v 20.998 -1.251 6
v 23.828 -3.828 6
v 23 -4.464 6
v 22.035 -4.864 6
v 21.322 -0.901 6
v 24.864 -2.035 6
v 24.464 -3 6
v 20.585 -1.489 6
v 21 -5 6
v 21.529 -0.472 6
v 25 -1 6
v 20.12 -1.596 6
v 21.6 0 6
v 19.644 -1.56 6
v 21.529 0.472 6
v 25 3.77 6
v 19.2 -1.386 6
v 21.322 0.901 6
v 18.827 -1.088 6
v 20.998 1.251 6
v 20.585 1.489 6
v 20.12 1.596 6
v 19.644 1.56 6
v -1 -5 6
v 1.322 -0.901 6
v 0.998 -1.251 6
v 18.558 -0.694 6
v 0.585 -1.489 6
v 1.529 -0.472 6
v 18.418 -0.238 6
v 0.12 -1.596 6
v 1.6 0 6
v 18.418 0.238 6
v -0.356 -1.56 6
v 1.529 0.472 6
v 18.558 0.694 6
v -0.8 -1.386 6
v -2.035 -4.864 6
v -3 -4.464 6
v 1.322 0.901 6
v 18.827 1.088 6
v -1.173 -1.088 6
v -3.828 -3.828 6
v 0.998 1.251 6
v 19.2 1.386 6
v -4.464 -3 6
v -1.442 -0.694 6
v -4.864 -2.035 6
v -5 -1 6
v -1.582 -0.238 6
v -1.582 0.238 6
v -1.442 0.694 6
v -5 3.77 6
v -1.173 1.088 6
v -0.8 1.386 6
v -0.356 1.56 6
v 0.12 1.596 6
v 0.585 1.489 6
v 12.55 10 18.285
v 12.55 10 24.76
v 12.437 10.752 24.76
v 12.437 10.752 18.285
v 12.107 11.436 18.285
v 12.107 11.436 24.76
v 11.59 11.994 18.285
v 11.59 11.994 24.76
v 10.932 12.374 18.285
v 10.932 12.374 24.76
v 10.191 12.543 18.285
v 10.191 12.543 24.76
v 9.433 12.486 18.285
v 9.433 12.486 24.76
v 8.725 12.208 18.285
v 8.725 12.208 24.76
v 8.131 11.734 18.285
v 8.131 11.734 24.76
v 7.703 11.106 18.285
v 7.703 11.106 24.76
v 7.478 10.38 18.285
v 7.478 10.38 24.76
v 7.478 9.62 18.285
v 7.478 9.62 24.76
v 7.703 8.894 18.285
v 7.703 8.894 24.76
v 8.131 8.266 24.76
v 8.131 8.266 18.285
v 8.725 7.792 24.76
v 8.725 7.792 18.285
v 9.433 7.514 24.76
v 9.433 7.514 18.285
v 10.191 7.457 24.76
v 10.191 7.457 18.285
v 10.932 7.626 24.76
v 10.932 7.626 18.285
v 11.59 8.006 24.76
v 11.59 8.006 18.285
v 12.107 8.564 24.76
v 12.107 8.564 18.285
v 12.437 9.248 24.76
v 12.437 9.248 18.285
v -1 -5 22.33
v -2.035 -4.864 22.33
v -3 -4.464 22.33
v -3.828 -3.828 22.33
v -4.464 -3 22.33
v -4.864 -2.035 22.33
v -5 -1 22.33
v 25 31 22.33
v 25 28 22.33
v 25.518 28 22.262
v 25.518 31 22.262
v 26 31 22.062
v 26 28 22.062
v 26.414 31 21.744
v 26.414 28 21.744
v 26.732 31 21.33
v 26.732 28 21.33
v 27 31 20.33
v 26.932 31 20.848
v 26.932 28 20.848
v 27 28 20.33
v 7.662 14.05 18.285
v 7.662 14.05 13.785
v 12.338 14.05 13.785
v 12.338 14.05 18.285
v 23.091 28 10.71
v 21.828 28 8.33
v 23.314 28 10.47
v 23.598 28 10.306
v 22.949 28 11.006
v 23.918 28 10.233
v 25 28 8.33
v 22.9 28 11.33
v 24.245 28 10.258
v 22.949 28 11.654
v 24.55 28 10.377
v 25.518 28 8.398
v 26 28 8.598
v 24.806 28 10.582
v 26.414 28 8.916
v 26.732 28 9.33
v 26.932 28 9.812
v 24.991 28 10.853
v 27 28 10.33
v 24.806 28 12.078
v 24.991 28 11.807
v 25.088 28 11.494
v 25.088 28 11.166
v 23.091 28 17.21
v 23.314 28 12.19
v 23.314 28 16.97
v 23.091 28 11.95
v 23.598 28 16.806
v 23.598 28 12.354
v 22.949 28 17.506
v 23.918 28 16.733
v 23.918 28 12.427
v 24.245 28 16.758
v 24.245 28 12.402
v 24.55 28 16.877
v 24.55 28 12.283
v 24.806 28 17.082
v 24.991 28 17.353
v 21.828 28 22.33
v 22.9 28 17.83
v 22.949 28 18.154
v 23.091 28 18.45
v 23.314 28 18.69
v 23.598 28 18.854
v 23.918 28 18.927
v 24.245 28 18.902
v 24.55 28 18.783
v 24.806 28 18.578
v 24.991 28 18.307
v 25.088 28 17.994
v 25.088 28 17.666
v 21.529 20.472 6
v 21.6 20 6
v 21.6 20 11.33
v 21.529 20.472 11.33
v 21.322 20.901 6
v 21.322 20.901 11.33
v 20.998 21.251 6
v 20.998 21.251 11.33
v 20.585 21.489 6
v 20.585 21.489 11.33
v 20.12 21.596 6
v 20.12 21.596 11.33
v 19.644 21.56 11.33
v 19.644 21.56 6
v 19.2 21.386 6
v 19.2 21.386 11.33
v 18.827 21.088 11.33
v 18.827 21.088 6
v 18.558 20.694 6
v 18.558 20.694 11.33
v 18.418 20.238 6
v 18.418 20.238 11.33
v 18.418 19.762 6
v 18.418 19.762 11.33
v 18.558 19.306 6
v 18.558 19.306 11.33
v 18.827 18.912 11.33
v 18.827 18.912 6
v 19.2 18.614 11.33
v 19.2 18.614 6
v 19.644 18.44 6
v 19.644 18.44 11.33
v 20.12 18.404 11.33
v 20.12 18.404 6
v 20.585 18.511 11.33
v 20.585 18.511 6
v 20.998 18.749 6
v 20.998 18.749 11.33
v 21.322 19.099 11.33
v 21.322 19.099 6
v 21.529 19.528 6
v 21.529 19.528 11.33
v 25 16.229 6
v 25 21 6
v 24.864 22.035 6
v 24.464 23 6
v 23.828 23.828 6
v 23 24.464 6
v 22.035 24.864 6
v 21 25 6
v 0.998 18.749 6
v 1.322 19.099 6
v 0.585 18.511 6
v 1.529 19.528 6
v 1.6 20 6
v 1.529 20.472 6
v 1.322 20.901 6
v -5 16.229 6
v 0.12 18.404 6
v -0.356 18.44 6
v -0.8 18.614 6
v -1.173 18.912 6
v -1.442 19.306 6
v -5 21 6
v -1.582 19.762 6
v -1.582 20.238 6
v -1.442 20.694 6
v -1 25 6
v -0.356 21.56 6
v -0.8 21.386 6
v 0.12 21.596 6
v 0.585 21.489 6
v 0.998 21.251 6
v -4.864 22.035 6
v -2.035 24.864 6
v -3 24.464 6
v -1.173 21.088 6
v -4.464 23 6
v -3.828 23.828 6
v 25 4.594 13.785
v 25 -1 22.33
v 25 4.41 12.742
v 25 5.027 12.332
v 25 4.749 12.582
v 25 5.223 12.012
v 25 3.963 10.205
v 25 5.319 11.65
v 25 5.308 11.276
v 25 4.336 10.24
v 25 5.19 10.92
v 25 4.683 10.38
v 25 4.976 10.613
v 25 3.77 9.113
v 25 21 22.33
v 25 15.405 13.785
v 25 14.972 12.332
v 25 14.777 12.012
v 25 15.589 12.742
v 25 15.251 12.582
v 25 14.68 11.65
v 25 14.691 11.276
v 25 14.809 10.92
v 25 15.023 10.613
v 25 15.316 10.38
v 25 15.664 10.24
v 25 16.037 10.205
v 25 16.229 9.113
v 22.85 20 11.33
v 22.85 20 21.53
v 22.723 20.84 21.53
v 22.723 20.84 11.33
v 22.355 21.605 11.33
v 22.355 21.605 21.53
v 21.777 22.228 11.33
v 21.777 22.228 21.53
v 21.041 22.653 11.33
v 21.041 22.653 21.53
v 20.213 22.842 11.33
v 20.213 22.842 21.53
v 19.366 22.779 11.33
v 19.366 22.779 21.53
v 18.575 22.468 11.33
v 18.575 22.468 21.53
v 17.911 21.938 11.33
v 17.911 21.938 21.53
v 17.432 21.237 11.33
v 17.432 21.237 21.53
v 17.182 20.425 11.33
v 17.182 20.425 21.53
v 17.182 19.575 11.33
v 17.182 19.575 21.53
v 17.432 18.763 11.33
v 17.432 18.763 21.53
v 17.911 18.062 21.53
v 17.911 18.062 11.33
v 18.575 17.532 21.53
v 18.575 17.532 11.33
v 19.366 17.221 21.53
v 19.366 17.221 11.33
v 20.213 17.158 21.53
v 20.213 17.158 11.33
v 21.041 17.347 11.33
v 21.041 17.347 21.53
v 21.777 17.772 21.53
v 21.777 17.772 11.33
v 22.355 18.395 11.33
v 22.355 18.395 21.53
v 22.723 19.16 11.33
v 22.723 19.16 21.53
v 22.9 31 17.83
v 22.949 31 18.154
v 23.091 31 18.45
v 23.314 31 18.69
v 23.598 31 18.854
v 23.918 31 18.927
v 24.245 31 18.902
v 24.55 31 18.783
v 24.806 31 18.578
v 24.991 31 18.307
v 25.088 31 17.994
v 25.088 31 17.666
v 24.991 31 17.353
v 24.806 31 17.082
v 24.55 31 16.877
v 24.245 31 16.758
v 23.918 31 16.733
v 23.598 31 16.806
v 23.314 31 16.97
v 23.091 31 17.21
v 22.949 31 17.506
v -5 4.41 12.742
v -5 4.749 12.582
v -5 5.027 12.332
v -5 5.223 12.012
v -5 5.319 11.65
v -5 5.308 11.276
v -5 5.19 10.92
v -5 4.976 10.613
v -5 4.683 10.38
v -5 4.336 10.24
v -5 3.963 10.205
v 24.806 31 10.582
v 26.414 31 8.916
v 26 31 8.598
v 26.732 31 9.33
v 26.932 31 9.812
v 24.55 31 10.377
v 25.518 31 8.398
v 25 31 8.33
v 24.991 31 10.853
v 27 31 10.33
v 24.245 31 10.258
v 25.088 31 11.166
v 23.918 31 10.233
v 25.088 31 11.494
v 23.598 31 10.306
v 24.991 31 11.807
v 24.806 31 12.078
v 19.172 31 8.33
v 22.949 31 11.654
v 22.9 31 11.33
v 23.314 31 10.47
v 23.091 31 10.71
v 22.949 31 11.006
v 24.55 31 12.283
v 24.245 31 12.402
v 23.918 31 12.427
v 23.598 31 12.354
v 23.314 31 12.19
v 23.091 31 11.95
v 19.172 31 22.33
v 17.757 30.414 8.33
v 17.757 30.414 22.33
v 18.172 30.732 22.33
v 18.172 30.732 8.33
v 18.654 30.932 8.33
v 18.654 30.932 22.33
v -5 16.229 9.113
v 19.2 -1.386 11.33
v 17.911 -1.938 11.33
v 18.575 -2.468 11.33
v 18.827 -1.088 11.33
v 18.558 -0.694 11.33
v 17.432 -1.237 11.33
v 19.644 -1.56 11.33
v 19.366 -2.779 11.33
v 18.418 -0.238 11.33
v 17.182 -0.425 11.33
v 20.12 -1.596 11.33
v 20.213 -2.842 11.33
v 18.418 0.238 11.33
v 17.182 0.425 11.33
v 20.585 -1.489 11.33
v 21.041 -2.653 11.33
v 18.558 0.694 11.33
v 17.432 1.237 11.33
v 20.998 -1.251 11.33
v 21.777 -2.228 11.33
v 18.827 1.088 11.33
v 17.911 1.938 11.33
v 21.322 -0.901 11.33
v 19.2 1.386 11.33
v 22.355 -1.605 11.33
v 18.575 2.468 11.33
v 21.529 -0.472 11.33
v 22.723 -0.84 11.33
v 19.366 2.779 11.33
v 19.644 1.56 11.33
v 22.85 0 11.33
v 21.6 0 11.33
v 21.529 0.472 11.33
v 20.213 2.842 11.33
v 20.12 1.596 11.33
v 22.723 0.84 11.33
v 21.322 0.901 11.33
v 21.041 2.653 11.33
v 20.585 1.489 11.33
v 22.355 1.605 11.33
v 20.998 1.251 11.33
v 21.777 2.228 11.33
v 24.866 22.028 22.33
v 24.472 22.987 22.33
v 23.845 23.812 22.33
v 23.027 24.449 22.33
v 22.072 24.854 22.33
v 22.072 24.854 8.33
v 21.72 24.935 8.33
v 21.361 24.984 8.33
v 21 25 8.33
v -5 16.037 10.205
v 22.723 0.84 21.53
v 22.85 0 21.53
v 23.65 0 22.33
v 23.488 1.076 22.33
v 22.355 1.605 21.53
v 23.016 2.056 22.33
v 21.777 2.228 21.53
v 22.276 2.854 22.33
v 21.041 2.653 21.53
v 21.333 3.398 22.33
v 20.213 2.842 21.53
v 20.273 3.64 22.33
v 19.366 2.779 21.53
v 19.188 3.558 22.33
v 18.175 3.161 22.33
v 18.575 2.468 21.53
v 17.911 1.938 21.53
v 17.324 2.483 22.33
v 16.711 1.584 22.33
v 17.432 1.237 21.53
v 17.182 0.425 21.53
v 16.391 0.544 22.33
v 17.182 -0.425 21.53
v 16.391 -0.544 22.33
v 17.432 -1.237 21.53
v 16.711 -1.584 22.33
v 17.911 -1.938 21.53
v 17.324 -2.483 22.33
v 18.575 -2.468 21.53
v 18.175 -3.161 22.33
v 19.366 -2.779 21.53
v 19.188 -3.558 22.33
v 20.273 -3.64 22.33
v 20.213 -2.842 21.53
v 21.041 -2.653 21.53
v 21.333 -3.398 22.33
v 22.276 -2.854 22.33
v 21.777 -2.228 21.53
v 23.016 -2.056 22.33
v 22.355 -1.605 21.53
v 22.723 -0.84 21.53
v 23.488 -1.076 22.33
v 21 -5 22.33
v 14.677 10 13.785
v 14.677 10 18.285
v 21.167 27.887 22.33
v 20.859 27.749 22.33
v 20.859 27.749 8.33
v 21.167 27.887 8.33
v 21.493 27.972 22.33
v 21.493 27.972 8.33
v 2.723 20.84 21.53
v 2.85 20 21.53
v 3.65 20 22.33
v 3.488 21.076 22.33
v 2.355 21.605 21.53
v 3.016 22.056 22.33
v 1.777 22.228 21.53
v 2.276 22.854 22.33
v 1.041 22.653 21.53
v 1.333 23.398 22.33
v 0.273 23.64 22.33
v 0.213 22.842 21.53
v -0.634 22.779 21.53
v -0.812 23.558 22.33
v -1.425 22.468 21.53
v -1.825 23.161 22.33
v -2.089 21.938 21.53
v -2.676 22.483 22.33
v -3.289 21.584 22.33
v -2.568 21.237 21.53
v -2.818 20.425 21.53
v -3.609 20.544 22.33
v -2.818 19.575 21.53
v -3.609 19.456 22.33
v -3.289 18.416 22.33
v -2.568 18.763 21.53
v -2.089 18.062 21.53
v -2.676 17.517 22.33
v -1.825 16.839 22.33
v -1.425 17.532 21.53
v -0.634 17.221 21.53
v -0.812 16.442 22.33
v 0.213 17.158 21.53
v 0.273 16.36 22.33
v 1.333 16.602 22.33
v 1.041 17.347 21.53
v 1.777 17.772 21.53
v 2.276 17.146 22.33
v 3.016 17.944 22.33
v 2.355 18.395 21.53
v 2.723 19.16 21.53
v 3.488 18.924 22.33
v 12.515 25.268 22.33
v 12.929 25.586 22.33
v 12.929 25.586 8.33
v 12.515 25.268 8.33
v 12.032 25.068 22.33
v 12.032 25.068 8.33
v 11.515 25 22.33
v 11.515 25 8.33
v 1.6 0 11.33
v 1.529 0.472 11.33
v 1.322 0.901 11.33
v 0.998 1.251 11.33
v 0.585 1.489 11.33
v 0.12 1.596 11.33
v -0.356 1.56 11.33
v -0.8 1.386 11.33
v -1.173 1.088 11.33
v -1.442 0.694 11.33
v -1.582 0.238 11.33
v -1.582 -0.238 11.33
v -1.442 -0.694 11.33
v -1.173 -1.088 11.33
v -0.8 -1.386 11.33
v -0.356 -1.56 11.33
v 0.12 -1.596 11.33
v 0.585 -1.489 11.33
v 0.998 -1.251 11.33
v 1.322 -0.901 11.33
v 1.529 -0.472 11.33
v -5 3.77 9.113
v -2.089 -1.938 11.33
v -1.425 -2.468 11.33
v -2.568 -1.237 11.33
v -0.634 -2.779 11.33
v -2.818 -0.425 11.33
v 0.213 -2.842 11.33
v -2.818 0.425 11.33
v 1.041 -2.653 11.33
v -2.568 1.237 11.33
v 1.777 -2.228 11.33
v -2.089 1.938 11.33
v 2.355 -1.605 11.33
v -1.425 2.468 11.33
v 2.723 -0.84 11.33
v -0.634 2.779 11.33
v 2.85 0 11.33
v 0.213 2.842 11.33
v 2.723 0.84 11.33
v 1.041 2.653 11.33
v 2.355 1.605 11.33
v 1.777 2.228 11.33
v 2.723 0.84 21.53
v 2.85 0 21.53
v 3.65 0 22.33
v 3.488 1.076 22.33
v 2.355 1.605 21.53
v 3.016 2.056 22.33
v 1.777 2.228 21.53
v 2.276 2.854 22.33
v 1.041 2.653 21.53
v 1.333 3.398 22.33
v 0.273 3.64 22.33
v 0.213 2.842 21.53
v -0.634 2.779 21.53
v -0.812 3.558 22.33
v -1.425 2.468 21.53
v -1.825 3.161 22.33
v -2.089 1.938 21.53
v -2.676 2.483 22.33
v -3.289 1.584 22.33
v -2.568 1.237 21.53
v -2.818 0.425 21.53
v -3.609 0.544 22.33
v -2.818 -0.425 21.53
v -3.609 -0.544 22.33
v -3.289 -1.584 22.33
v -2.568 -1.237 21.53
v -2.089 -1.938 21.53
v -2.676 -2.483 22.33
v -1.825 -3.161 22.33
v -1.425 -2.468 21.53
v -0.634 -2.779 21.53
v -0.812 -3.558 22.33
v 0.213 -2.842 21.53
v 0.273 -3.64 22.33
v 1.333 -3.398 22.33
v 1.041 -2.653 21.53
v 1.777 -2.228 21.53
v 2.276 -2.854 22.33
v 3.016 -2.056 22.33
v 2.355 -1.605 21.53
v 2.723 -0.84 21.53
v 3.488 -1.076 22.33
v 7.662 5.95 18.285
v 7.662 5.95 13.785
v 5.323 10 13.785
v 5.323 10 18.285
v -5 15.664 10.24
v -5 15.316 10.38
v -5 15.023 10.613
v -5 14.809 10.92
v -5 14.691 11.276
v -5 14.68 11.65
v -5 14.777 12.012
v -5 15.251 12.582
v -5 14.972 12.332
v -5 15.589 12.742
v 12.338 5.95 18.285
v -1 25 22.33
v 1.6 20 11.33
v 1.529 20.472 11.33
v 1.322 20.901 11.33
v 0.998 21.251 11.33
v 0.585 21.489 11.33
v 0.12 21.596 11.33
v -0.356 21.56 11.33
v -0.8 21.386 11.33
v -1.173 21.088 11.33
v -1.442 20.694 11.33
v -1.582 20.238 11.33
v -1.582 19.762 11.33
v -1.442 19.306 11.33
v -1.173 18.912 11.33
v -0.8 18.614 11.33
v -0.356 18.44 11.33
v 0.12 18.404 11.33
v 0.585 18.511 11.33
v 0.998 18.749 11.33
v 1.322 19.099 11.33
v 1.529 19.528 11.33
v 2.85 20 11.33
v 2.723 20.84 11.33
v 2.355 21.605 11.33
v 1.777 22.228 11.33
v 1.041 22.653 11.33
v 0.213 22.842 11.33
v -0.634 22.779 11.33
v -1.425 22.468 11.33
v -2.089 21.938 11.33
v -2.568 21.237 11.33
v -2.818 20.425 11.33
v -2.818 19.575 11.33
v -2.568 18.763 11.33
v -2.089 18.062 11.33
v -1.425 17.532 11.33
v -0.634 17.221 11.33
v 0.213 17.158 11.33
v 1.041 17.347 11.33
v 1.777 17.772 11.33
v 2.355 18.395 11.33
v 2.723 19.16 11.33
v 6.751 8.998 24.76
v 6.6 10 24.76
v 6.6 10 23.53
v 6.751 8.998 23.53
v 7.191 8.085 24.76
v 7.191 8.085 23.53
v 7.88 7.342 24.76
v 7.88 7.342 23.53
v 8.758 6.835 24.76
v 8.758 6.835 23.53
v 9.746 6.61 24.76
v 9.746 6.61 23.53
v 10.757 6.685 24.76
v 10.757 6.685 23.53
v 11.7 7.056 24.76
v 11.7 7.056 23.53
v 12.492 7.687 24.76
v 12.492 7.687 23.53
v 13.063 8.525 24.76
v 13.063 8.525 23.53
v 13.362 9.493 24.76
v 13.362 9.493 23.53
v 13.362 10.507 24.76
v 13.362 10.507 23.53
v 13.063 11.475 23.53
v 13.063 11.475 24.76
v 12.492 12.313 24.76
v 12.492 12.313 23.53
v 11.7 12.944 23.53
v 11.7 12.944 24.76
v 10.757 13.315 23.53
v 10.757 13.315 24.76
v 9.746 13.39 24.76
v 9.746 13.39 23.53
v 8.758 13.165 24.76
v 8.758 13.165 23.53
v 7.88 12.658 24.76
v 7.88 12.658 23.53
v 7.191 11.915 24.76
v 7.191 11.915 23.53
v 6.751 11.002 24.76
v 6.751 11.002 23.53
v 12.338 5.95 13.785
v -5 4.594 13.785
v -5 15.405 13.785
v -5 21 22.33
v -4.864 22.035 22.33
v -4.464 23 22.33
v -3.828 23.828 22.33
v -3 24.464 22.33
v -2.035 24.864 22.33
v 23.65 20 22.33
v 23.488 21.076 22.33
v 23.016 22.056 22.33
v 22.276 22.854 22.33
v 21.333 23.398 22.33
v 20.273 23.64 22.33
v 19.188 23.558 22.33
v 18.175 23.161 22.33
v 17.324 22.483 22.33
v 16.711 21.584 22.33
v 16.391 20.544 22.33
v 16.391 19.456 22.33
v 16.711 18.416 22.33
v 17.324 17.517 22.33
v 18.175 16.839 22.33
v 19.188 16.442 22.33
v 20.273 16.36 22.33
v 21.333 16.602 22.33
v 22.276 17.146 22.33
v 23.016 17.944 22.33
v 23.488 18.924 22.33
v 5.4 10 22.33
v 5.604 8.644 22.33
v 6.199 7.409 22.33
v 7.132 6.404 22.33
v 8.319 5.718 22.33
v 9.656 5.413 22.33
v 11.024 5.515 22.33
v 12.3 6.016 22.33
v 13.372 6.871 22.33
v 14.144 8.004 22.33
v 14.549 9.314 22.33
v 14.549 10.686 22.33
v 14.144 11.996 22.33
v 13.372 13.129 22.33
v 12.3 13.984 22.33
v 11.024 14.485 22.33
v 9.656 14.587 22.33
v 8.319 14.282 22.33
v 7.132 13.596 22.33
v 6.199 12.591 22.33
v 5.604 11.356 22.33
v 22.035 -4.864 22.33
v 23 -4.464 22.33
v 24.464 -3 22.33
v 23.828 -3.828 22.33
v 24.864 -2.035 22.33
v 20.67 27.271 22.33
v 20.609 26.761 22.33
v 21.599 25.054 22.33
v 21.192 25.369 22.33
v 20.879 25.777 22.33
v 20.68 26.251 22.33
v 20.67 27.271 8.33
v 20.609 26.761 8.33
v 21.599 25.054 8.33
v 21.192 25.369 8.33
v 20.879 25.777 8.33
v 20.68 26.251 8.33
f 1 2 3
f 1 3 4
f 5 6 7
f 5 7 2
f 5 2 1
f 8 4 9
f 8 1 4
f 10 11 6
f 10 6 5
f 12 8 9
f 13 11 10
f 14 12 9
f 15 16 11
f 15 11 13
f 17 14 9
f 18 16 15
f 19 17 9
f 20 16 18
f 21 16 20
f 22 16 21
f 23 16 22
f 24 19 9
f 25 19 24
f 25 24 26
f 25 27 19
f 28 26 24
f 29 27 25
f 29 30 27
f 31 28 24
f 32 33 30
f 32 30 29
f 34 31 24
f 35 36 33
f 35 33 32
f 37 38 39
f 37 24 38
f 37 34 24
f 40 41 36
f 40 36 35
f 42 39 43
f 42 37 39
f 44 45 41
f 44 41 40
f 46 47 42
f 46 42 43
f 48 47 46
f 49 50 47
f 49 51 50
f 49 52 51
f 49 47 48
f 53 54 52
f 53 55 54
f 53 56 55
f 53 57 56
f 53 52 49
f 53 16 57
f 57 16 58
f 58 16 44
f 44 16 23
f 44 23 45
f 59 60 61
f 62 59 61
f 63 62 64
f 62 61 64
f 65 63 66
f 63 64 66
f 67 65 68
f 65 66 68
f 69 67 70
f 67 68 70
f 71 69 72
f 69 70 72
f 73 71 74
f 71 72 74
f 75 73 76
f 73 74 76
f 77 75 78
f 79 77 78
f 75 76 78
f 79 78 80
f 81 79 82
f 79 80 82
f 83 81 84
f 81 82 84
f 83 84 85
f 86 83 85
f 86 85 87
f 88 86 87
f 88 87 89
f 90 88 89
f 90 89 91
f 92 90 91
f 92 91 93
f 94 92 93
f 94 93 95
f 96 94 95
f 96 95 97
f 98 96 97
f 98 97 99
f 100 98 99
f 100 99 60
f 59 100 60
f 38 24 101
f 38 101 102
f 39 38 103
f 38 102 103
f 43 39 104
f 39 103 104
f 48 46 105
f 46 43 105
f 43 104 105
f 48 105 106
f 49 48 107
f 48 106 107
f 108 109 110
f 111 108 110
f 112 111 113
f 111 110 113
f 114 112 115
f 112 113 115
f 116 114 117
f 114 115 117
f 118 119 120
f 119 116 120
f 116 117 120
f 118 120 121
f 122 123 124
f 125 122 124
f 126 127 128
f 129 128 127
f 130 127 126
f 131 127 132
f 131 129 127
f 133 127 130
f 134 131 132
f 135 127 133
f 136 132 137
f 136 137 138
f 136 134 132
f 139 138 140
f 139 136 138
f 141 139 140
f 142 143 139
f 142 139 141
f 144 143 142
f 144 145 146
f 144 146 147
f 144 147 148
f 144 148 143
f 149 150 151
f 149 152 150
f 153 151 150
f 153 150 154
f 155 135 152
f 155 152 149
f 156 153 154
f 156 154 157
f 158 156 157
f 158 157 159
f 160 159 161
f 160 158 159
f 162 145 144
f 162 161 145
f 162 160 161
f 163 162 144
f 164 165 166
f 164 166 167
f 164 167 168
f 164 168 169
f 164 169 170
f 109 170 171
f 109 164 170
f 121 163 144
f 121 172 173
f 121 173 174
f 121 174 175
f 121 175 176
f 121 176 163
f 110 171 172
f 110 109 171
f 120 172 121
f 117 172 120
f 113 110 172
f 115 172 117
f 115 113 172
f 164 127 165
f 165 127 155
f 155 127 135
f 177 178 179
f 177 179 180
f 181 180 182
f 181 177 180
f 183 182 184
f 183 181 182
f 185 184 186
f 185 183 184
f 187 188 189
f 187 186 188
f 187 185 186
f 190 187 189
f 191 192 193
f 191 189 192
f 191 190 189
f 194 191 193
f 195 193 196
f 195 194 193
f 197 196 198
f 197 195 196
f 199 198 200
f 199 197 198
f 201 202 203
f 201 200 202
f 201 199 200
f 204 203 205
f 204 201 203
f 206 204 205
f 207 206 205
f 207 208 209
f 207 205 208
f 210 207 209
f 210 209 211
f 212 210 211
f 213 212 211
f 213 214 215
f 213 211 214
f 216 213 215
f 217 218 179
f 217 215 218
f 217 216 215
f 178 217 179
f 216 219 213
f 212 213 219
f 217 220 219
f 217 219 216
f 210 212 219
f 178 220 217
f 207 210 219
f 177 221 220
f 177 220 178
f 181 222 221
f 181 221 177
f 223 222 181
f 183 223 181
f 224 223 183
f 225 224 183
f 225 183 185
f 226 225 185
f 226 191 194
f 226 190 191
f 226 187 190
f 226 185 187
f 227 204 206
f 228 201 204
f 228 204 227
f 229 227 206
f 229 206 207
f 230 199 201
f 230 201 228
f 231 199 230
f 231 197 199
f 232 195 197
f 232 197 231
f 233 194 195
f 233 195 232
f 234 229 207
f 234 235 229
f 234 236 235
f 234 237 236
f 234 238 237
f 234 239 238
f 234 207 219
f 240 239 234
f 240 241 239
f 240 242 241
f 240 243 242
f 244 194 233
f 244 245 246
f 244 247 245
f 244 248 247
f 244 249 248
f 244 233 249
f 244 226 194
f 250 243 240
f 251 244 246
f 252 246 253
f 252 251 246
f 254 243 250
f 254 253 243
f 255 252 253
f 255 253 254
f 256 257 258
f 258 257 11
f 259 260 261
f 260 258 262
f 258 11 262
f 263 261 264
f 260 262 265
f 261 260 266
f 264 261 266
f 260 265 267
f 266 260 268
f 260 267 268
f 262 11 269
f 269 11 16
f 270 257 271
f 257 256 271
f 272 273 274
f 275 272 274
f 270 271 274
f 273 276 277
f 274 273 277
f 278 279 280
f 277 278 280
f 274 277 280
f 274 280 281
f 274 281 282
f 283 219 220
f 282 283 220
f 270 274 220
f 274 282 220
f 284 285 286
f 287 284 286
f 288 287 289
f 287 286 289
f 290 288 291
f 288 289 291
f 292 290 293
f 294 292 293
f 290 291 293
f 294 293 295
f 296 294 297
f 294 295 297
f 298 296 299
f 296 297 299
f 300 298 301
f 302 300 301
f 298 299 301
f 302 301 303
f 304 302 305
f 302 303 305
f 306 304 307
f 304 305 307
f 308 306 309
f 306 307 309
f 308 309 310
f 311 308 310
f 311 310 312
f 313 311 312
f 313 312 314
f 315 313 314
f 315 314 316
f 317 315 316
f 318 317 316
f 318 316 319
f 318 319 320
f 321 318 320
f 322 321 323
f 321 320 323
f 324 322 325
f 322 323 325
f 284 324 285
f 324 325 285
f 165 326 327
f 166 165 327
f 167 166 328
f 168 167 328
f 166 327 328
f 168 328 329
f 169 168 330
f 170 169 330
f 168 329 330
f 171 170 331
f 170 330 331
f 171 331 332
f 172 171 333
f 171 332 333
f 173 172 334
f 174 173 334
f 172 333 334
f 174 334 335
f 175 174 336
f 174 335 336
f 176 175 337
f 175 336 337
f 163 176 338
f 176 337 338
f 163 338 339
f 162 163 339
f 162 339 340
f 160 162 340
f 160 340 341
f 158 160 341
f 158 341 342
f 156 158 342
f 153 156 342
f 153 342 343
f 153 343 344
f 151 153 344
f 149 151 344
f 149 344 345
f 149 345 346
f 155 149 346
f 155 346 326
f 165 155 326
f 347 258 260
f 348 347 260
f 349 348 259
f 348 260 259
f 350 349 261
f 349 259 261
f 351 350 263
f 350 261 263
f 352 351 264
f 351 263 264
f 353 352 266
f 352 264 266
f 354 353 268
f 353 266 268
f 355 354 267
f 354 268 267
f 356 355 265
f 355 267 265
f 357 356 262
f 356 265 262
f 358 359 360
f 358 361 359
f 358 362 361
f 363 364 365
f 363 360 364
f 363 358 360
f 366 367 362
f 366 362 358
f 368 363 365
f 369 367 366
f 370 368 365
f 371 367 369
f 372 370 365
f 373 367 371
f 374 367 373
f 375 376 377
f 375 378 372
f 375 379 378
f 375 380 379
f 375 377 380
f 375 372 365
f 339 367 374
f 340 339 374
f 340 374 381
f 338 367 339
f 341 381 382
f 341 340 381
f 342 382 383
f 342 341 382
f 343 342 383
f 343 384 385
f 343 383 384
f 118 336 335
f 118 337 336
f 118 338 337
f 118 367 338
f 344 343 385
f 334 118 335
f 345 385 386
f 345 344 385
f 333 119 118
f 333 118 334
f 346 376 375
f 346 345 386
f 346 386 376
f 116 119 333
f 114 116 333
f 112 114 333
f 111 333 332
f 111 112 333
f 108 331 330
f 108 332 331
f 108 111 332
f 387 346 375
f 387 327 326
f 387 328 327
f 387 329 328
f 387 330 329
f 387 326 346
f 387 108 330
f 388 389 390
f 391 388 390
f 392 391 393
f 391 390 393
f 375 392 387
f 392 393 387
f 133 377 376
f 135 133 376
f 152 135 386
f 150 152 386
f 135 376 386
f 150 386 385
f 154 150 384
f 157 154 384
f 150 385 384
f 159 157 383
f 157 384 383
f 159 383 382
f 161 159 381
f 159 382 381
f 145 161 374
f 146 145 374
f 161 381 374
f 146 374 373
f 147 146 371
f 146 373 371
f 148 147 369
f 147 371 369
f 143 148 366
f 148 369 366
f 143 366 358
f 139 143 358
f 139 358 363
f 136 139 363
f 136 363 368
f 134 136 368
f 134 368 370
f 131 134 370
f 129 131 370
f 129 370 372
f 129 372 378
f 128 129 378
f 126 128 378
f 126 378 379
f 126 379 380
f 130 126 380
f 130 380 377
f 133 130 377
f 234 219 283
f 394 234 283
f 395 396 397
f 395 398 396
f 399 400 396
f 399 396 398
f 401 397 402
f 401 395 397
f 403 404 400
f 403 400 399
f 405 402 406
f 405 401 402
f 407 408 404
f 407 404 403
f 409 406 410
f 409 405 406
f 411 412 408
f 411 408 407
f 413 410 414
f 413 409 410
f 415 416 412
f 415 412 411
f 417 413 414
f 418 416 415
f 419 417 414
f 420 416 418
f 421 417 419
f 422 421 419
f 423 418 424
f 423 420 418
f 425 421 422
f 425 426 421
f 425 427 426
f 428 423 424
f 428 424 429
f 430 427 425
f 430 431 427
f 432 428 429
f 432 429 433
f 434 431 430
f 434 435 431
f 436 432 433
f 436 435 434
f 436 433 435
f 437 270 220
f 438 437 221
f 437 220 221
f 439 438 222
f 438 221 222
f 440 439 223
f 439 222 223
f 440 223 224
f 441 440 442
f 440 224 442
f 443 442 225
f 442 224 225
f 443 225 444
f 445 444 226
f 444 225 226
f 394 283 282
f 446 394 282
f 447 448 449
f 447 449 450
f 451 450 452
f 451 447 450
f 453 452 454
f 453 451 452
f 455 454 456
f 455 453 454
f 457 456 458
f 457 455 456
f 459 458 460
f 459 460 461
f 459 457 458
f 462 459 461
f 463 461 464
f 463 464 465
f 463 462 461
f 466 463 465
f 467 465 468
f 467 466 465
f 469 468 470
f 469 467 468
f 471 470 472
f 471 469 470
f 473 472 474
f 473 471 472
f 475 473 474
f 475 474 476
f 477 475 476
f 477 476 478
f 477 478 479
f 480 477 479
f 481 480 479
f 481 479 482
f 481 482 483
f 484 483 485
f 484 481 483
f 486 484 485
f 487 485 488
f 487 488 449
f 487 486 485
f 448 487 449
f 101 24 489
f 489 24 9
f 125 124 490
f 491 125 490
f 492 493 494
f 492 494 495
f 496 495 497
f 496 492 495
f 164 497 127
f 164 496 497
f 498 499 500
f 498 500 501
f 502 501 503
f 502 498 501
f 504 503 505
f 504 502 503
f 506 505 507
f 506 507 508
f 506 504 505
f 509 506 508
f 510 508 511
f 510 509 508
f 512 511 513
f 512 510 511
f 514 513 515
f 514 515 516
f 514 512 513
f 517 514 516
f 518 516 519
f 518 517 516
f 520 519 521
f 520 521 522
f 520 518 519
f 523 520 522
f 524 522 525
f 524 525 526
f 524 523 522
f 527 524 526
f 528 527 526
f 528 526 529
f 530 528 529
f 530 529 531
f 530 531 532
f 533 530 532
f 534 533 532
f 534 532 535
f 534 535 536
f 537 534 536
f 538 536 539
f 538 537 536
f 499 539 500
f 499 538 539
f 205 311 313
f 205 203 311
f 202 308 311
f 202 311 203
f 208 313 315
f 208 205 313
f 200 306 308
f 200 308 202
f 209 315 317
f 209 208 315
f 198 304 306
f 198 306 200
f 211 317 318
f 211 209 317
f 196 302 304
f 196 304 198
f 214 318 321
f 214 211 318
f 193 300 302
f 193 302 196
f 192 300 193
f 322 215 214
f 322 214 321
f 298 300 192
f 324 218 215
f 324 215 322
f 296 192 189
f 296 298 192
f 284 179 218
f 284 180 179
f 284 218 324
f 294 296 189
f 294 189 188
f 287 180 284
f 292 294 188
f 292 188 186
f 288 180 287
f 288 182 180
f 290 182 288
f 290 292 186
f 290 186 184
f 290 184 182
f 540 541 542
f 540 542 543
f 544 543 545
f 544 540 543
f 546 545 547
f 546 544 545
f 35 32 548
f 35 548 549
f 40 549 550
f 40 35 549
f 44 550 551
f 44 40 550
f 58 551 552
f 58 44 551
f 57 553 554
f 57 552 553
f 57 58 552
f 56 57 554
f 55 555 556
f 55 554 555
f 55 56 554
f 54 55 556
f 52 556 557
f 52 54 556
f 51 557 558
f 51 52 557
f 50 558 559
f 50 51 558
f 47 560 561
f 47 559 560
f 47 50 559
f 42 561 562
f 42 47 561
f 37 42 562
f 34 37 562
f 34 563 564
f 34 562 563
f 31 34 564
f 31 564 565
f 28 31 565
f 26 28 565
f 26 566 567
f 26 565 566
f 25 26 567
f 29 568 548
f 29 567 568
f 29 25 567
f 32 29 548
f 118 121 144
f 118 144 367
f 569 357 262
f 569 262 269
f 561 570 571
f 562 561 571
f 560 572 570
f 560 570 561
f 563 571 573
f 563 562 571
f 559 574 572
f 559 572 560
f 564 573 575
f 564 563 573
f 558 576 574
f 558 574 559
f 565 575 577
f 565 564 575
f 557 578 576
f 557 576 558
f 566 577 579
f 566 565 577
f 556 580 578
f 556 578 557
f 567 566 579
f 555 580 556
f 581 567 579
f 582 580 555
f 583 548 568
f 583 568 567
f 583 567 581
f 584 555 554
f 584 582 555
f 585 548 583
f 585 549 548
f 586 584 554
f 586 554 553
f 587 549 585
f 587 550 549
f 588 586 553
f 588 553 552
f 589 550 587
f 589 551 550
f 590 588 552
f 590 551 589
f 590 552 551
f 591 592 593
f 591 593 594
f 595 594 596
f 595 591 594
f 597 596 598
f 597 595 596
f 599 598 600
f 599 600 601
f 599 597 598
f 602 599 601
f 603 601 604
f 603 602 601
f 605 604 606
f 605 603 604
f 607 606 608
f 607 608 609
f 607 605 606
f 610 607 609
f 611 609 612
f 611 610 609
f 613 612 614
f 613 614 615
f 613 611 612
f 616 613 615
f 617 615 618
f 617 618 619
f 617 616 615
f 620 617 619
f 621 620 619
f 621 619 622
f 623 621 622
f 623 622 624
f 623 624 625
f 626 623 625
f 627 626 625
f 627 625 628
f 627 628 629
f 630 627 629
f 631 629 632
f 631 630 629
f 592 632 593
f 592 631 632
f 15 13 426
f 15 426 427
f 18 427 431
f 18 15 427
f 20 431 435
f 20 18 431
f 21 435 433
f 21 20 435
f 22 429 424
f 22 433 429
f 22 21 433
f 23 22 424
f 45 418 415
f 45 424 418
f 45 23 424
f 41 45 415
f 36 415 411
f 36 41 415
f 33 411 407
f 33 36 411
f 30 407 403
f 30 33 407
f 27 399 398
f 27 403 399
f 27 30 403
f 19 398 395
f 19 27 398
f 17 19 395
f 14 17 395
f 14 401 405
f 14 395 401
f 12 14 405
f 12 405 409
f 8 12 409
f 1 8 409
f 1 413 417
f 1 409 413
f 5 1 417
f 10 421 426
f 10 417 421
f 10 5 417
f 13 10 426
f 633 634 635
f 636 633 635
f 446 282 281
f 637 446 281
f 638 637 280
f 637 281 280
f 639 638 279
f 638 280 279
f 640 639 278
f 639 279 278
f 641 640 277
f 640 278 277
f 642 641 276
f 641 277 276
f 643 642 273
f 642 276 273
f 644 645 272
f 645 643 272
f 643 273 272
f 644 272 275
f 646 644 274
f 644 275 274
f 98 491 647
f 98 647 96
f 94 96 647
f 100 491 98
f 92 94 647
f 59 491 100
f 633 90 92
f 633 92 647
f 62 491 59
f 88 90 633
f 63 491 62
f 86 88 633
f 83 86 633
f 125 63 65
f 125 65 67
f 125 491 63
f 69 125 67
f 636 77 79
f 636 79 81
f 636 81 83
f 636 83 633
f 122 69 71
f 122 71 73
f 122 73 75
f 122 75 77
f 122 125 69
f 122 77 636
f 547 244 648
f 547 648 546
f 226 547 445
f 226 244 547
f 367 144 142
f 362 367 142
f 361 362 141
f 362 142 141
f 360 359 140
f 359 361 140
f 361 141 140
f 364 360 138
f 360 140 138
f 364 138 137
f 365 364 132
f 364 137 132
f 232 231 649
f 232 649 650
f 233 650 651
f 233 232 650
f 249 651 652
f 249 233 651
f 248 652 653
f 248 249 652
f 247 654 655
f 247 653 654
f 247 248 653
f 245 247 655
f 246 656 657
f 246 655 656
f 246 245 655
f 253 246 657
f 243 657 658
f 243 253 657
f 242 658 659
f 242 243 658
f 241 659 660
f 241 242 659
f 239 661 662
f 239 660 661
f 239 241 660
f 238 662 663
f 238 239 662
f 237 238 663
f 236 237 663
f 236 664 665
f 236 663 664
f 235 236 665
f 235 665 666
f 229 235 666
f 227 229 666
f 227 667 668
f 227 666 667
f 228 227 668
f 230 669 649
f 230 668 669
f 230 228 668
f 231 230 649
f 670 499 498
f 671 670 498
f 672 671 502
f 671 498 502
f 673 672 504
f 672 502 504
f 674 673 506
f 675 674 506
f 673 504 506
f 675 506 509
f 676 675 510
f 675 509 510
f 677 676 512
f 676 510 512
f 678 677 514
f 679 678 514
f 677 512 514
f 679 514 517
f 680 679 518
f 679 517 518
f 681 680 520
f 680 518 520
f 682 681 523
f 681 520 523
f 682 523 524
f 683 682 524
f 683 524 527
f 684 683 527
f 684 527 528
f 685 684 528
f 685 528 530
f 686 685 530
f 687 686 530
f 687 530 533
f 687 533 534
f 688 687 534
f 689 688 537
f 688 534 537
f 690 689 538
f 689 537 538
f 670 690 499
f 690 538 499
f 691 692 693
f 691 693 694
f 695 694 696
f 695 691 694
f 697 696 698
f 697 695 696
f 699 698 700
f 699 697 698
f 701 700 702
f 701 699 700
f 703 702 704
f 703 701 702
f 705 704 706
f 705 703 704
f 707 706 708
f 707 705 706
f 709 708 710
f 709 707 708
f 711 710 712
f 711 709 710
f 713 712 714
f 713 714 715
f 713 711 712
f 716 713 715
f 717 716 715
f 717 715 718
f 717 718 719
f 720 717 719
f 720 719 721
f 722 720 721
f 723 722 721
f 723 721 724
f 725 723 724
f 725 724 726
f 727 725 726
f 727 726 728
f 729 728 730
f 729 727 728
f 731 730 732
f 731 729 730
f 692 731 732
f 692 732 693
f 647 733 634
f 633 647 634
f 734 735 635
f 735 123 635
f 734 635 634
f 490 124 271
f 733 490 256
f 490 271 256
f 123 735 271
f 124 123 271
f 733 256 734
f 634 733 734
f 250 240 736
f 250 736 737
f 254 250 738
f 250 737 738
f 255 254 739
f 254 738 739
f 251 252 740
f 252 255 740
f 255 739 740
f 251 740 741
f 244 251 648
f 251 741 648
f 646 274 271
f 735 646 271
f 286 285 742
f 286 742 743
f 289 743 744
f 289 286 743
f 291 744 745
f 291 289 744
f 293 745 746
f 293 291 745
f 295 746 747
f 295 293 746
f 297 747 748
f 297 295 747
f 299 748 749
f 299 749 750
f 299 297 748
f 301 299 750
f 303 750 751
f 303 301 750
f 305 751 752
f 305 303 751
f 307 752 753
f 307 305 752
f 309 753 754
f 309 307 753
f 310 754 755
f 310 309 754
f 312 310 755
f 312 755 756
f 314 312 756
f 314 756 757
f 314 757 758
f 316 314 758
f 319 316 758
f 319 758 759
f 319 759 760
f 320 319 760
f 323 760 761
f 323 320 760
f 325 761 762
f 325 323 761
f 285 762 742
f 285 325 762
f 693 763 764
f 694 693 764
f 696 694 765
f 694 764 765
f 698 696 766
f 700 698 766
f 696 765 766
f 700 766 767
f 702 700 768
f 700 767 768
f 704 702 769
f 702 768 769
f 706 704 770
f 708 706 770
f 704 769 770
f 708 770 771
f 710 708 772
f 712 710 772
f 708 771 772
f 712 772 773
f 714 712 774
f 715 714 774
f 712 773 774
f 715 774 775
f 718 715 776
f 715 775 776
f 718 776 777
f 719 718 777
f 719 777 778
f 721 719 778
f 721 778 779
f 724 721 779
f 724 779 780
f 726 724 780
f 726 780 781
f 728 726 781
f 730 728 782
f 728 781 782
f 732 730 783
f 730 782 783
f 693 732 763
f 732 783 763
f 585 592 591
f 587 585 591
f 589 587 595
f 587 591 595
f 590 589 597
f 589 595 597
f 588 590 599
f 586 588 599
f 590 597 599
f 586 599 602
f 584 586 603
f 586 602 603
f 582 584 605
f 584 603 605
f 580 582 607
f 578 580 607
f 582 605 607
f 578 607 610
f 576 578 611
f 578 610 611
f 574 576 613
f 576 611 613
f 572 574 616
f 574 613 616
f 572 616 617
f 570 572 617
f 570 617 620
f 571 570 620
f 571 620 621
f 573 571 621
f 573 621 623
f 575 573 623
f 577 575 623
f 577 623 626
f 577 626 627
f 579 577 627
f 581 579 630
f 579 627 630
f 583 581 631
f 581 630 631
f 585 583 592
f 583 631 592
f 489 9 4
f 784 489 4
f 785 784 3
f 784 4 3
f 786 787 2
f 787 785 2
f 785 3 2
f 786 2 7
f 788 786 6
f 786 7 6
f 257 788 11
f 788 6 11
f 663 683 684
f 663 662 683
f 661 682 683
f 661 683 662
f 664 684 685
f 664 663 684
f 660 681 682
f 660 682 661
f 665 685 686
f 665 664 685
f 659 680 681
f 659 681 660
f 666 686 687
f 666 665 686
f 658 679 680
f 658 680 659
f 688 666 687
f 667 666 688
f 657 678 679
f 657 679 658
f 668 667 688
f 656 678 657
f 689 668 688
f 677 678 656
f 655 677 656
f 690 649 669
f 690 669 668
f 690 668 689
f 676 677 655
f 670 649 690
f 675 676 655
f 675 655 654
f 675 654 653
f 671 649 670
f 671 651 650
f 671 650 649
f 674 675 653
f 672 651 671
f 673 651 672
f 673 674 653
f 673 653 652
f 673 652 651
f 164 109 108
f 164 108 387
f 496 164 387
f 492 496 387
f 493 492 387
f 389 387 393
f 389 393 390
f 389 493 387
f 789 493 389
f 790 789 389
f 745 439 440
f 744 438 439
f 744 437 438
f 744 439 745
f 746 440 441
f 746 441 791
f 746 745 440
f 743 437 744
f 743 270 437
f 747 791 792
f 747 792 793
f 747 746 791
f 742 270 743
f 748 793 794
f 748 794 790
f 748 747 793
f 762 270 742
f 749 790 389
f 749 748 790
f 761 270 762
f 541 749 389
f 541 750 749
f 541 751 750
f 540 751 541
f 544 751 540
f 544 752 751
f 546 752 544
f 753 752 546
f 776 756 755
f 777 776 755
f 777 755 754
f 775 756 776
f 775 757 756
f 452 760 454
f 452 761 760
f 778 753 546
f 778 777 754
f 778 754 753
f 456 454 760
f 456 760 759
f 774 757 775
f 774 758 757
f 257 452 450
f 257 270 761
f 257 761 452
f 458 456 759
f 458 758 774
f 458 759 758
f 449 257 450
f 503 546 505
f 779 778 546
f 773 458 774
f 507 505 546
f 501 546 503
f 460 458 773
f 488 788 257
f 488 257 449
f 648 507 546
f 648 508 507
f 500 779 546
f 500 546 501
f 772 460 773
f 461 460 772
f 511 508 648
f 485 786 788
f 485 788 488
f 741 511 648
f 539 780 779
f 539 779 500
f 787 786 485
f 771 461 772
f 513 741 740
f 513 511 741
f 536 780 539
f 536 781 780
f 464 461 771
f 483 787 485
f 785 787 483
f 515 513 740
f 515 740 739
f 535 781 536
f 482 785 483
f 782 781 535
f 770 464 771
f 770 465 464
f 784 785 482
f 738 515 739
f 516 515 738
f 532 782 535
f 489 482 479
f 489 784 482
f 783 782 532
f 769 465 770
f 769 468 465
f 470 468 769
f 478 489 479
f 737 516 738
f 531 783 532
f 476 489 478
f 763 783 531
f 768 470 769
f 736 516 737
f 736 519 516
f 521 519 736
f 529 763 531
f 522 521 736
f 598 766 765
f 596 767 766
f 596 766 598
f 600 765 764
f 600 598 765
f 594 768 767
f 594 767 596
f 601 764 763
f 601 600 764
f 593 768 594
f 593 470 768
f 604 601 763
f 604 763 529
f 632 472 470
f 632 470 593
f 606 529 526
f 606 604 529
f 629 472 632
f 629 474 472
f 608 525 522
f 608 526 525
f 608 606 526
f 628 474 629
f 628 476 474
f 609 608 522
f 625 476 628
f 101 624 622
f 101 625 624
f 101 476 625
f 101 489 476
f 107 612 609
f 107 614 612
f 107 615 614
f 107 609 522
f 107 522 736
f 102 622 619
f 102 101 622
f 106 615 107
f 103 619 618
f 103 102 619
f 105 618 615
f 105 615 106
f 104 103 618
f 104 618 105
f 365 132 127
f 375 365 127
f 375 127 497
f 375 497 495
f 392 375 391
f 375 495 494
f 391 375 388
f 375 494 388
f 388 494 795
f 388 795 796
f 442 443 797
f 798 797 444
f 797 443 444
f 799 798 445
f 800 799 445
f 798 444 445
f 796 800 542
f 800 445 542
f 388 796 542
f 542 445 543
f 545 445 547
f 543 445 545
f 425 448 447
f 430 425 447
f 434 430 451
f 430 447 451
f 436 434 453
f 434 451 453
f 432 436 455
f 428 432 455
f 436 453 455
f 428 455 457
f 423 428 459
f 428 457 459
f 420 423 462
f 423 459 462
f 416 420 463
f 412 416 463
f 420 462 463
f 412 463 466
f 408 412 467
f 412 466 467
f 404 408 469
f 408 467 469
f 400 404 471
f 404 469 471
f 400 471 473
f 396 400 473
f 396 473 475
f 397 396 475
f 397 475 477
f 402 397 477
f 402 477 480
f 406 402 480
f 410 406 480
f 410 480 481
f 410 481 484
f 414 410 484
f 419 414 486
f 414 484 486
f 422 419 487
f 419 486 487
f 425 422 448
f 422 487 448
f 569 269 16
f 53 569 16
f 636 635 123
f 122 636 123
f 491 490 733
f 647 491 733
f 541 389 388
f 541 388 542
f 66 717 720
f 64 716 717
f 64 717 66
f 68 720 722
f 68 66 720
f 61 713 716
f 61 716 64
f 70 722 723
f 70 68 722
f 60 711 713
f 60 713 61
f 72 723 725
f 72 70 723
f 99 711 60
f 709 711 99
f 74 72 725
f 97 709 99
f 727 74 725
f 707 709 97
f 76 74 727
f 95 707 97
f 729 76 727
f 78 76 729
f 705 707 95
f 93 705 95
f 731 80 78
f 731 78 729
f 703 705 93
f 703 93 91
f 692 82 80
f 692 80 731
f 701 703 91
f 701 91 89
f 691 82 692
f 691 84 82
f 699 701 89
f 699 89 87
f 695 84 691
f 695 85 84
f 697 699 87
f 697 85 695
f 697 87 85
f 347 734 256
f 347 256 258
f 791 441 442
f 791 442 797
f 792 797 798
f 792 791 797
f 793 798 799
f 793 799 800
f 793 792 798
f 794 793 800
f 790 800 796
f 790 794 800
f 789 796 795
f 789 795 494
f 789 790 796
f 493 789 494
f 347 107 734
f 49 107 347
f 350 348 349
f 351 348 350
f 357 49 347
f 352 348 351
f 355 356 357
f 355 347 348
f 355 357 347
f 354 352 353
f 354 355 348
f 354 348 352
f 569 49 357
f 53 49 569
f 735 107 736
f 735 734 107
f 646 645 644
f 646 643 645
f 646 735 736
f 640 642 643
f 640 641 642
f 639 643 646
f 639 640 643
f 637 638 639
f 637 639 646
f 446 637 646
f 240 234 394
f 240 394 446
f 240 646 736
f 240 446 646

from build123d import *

# Parameters (mm, degrees)
SKETCH1_W                  = 30
SKETCH1_H                  = 30
SKETCH1_R                  = 1.6
SKETCH1_W_2                = 81.01
SKETCH1_H_2                = 12
BOSS_EXTRUDE1_DEPTH        = 6
SKETCH1_3_W                = 30
SKETCH1_3_H                = 30
SKETCH1_3_R                = 1.6
BOSS_EXTRUDE2_DEPTH        = 22.33
CUT_EXTRUDE1_DEPTH         = 88.671255266
SKETCH3_R                  = 2.55
CUT_EXTRUDE2_DEPTH         = 8
CUT_EXTRUDE3_DEPTH         = 4.5
SKETCH6_R                  = 5
CUT_EXTRUDE5_DEPTH         = 8.6
SKETCH7_R                  = 1.6
CUT_EXTRUDE6_DEPTH         = 112.183402538
SKETCH8_R                  = 2.85
CUT_EXTRUDE7_DEPTH         = 11
BOSS_EXTRUDE3_START        = 2.43
SKETCH9_R                  = 3.4
SKETCH9_R_2                = 2.55
BOSS_EXTRUDE3_DEPTH        = 2.43
CHAMFER1_SIZE              = 1.2
FILLET3_R                  = 4
CHAMFER2_SIZE              = 0.8
BOSS_EXTRUDE6_DEPTH        = 14
CUT_EXTRUDE10_REACH        = 116.661
SKETCH17_R                 = 1.1
FILLET5_R                  = 2
CUT_EXTRUDE11_DEPTH        = 3
CHAMFER3_SIZE              = 0.8
LPATTERN2_COUNT            = 3
LPATTERN2_PITCH            = 25
CHAMFER3_OF_LPATTERN2_SIZE = 0.8
SKETCH18_W                 = 122.175107863
SKETCH18_H                 = 35.769473483
CUT_EXTRUDE12_DEPTH        = 6


with BuildPart() as part:
    # Sketch1 → Boss-Extrude1 (new body)
    # profile 1 of 2: a face of its own
    with BuildSketch(Plane.XY):
        with Locations((10, 10)):
            Rectangle(SKETCH1_W, SKETCH1_H)
        with Locations((20, 0)):
            Circle(SKETCH1_R, mode=Mode.SUBTRACT)
        with Locations((20, 20)):
            Circle(SKETCH1_R, mode=Mode.SUBTRACT)
        with Locations((0, 20)):
            Circle(SKETCH1_R, mode=Mode.SUBTRACT)
        Circle(SKETCH1_R, mode=Mode.SUBTRACT)
    # profile 2 of 2: a face of its own
    with BuildSketch(Plane.XY):
        with Locations((65.505, 10)):
            Rectangle(SKETCH1_W_2, SKETCH1_H_2)
    extrude(amount=BOSS_EXTRUDE1_DEPTH)

    # Sketch1<3> → Boss-Extrude2 (add)
    with BuildSketch(Plane.XY):
        with Locations((10, 10)):
            Rectangle(SKETCH1_3_W, SKETCH1_3_H)
        with Locations((20, 0)):
            Circle(SKETCH1_3_R, mode=Mode.SUBTRACT)
        with Locations((20, 20)):
            Circle(SKETCH1_3_R, mode=Mode.SUBTRACT)
        with Locations((0, 20)):
            Circle(SKETCH1_3_R, mode=Mode.SUBTRACT)
        Circle(SKETCH1_3_R, mode=Mode.SUBTRACT)
    extrude(amount=BOSS_EXTRUDE2_DEPTH)

    # Sketch2 → Cut-Extrude1 (cut, through all)
    with BuildSketch(Plane(origin=(25, 0, 0), x_dir=(0, 0, -1), z_dir=(1, 0, 0))):
        with BuildLine():
            Line((-6.517643056, 16.229072043), (-9.113243056, 16.229072043))
            Line((-9.113243056, 16.229072043), (-10.205127296, 16.036543391))
            ThreePointArc((-10.205127296, 16.036543391), (-11.275834451, 14.691428541), (-12.742026437, 15.589219625))
            Line((-12.742026437, 15.589219625), (-13.785323056, 15.405258283))
            Line((-13.785323056, 15.405258283), (-13.785323056, 4.594005803))
            Line((-13.785323056, 4.594005803), (-12.742026437, 4.41004446))
            ThreePointArc((-12.742026437, 4.41004446), (-11.275834451, 5.307835545), (-10.205127296, 3.962720694))
            Line((-10.205127296, 3.962720694), (-9.113243056, 3.770192043))
            Line((-9.113243056, 3.770192043), (-6.517643056, 3.770192043))
            Line((-6.517643056, 3.770192043), (-5.963076397, 3.770192043))
            Line((-5.963076397, 3.770192043), (-5.963076397, 16.229072043))
            Line((-5.963076397, 16.229072043), (-6.517643056, 16.229072043))
        make_face()
    extrude(amount=-CUT_EXTRUDE1_DEPTH, mode=Mode.SUBTRACT)

    # Sketch3 → Cut-Extrude2 (cut)
    with BuildSketch(Plane.XY.offset(22.33)):
        with Locations((10, 10)):
            Circle(SKETCH3_R)
    extrude(amount=-CUT_EXTRUDE2_DEPTH, mode=Mode.SUBTRACT)

    # Sketch5 → Cut-Extrude3 (cut)
    with BuildSketch(Plane(origin=(0, 0, 13.785323056), x_dir=(-1, 0, 0), z_dir=(0, 0, -1))):
        Polygon((-5.32346282, 10), (-7.66173141, 14.05), (-12.33826859, 14.05), (-14.67653718, 10), (-12.33826859, 5.95), (-7.66173141, 5.95), align=None)
    extrude(amount=-CUT_EXTRUDE3_DEPTH, mode=Mode.SUBTRACT)

    # Sketch6 → Cut-Extrude5 (cut)
    with BuildSketch(Plane(origin=(0, 0, 0), x_dir=(-1, 0, 0), z_dir=(0, 0, -1))):
        with Locations((-10, 10)):
            Circle(SKETCH6_R)
    extrude(amount=-CUT_EXTRUDE5_DEPTH, mode=Mode.SUBTRACT)

    # Sketch7 → Cut-Extrude6 (cut, through all)
    with BuildSketch(Plane(origin=(0, 0, 0), x_dir=(-1, 0, 0), z_dir=(0, 0, -1))):
        with BuildLine():
            ThreePointArc((-101.1, 10), (-99.5, 8.4), (-97.9, 10))
            Line((-97.9, 10), (-101.1, 10))
        make_face()
        with BuildLine():
            Line((-101.1, 10), (-97.9, 10))
            ThreePointArc((-97.9, 10), (-99.5, 11.6), (-101.1, 10))
        make_face()
        with Locations((-74.5, 10)):
            Circle(SKETCH7_R)
        with Locations((-49.5, 10)):
            Circle(SKETCH7_R)
    extrude(amount=-CUT_EXTRUDE6_DEPTH, mode=Mode.SUBTRACT)

    # Sketch8 → Cut-Extrude7 (cut)
    with BuildSketch(Plane.XY.offset(22.33)):
        with Locations((20, 20)):
            Circle(SKETCH8_R)
        with Locations((20, 0)):
            Circle(SKETCH8_R)
        Circle(SKETCH8_R)
        with Locations((0, 20)):
            Circle(SKETCH8_R)
    extrude(amount=-CUT_EXTRUDE7_DEPTH, mode=Mode.SUBTRACT)

    # Sketch9 → Boss-Extrude3 (add)
    with BuildSketch(Plane.XY.offset(22.33).offset(BOSS_EXTRUDE3_START)):
        with Locations(Location((10, 10, 0), (0, 0, 180))):
            Circle(SKETCH9_R)
        with Locations((10, 10)):
            Circle(SKETCH9_R_2, mode=Mode.SUBTRACT)
    extrude(amount=-BOSS_EXTRUDE3_DEPTH)

    # Chamfer1
    chamfer1_edges = [part.edges().sort_by_distance(p)[0] for p in [
        (13.4, 10, 22.33),
    ]]
    chamfer(chamfer1_edges, length=CHAMFER1_SIZE)

    # Fillet3
    # the kernel refuses this fillet: 4 mm, written as the material it adds along each edge
    with BuildSketch(Plane(origin=(25, 4, 0), x_dir=(0, -1, 0), z_dir=(0, 0, 1))) as fillet3_piece_1:
        with BuildLine():
            CenterArc((FILLET3_R, FILLET3_R), FILLET3_R, 180, 90)
            Line((0, FILLET3_R), (0, 0))
            Line((0, 0), (FILLET3_R, 0))
        make_face()
    extrude(amount=5.963076397)
    with BuildSketch(Plane(origin=(25, 16, 0), x_dir=(0, 1, 0), z_dir=(0, 0, 1))) as fillet3_piece_2:
        with BuildLine():
            CenterArc((FILLET3_R, -FILLET3_R), FILLET3_R, 90, 90)
            Line((0, -FILLET3_R), (0, 0))
            Line((0, 0), (FILLET3_R, 0))
        make_face()
    extrude(amount=5.963076397)
    # the kernel refuses this fillet: 4 mm, written as the material it takes off along each edge
    with BuildSketch(Plane(origin=(-5, -5, 32.33), x_dir=(1, 0, 0), z_dir=(0, 0, -1)), Plane(origin=(-5, 25, 32.33), x_dir=(0, -1, 0), z_dir=(0, 0, -1)), Plane(origin=(25, 25, -10), x_dir=(0, -1, 0), z_dir=(0, 0, 1)), Plane(origin=(25, -5, -10), x_dir=(-1, 0, 0), z_dir=(0, 0, 1))) as fillet3_2_piece_1:
        with BuildLine():
            CenterArc((FILLET3_R, -FILLET3_R), FILLET3_R, 90, 90)
            Line((0, -FILLET3_R), (0, 0))
            Line((0, 0), (FILLET3_R, 0))
        make_face()
    extrude(amount=42.33, mode=Mode.SUBTRACT)
    with BuildSketch(Plane(origin=(106.01, 16, -10), x_dir=(-1, 0, 0), z_dir=(0, 0, 1))) as fillet3_2_piece_2:
        with BuildLine():
            CenterArc((FILLET3_R, FILLET3_R), FILLET3_R, 180, 90)
            Line((0, FILLET3_R), (0, 0))
            Line((0, 0), (FILLET3_R, 0))
        make_face()
    extrude(amount=26, mode=Mode.SUBTRACT)
    with BuildSketch(Plane(origin=(106.01, 4, -10), x_dir=(-1, 0, 0), z_dir=(0, 0, 1))) as fillet3_2_piece_3:
        with BuildLine():
            CenterArc((FILLET3_R, -FILLET3_R), FILLET3_R, 90, 90)
            Line((0, -FILLET3_R), (0, 0))
            Line((0, 0), (FILLET3_R, 0))
        make_face()
    extrude(amount=26, mode=Mode.SUBTRACT)

    # Chamfer2
    chamfer2_edges = [part.edges().sort_by_distance(p)[0] for p in [
        (-2.85, 20, 22.33),
        (-2.85, 0, 22.33),
        (17.15, 0, 22.33),
        (17.15, 20, 22.33),
    ]]
    chamfer(chamfer2_edges, length=CHAMFER2_SIZE)

    # Sketch15 → Boss-Extrude6 (add)
    with BuildSketch(Plane.XY.offset(22.33)):
        Polygon((18.343145751, 31), (12.343145751, 25), (18, 25), (21, 28), (27, 28), (27, 31), align=None)
    extrude(amount=-BOSS_EXTRUDE6_DEPTH)

    # Sketch17 → Cut-Extrude10 (cut, up to next)
    with BuildSketch(Plane(origin=(0, 31, 0), x_dir=(1, 0, 0), z_dir=(0, 1, 0)), mode=Mode.PRIVATE) as cut_extrude10_sk1:
        with Locations(Location((24, -11.33, 0), (0, 0, 180))):
            Circle(SKETCH17_R)
    cut_extrude10_tool1 = extrude(cut_extrude10_sk1.sketch, amount=-CUT_EXTRUDE10_REACH, mode=Mode.PRIVATE) & part.part
    # Sketch17 → Cut-Extrude10 (cut, up to next)
    with BuildSketch(Plane(origin=(0, 31, 0), x_dir=(1, 0, 0), z_dir=(0, 1, 0)), mode=Mode.PRIVATE) as cut_extrude10_sk2:
        with Locations(Location((24, -17.83, 0), (0, 0, 180))):
            Circle(SKETCH17_R)
    cut_extrude10_tool2 = extrude(cut_extrude10_sk2.sketch, amount=-CUT_EXTRUDE10_REACH, mode=Mode.PRIVATE) & part.part
    add(cut_extrude10_tool1.solids().sort_by_distance((24, 31, 11.33))[0], mode=Mode.SUBTRACT)
    add(cut_extrude10_tool2.solids().sort_by_distance((24, 31, 17.83))[0], mode=Mode.SUBTRACT)

    # Fillet5
    # the kernel refuses this fillet: 2 mm, written as the material it adds along each edge
    with BuildSketch(Plane(origin=(21, 28, 22.33), x_dir=(-0.7071067811865475, -0.7071067811865475, 0), z_dir=(0, 0, -1))) as fillet5_piece_1:
        with BuildLine():
            CenterArc((FILLET5_R * 0.414213562373, -FILLET5_R), FILLET5_R, 90, 45)
            Line((-FILLET5_R * 0.292893218813, -FILLET5_R * 0.292893218813), (0, 0))
            Line((0, 0), (FILLET5_R * 0.414213562373, 0))
        make_face()
    extrude(amount=14)
    with BuildSketch(Plane(origin=(12.343145751, 25, 22.33), x_dir=(-1, 0, 0), z_dir=(0, 0, -1))) as fillet5_piece_2:
        with BuildLine():
            CenterArc((FILLET5_R * 0.414213562373, FILLET5_R), FILLET5_R, 225, 45)
            Line((-FILLET5_R * 0.292893218813, FILLET5_R * 0.292893218813), (0, 0))
            Line((0, 0), (FILLET5_R * 0.414213562373, 0))
        make_face()
    extrude(amount=14)
    with BuildSketch(Plane(origin=(18, 25, 22.33), x_dir=(0.9993539414176275, -0.035940225000035846, 0), z_dir=(0, 0, -1))) as fillet5_piece_3:
        with BuildLine():
            CenterArc((4.541773641, -1.944797545), FILLET5_R, 103.492916805, 119.447416414)
            Line((3.07764659, -3.307270289), (2.931233885, -3.443517564))
            Line((2.931233885, -3.443517564), (-0.146412705, -0.136247274))
            Line((-0.146412705, -0.136247274), (0.007188045, 0.199870788))
            ThreePointArc((0.007188045, 0.199870788), (3.005249869, 0.092050113), (4.028458305, 0.194479755))
            Line((4.028458305, 0.194479755), (4.075123335, 0))
        make_face()
    extrude(amount=14)
    # the kernel refuses this fillet: 2 mm, written as the material it takes off along each edge
    with BuildSketch(Plane(origin=(27, 23, 22.33), x_dir=(-1, 0, 0), z_dir=(0, 1, 0))) as fillet5_2_piece_1:
        with BuildLine():
            CenterArc((FILLET5_R, -FILLET5_R), FILLET5_R, 90, 90)
            Line((0, -FILLET5_R), (0, 0))
            Line((0, 0), (FILLET5_R, 0))
        make_face()
    extrude(amount=13, mode=Mode.SUBTRACT)
    with BuildSketch(Plane(origin=(27, 23, 8.33), x_dir=(-1, 0, 0), z_dir=(0, 1, 0))) as fillet5_2_piece_2:
        with BuildLine():
            CenterArc((FILLET5_R, FILLET5_R), FILLET5_R, 180, 90)
            Line((0, FILLET5_R), (0, 0))
            Line((0, 0), (FILLET5_R, 0))
        make_face()
    extrude(amount=13, mode=Mode.SUBTRACT)
    with BuildSketch(Plane(origin=(18.343145751, 31, 24.401067812), x_dir=(-0.7071067811865476, -0.7071067811865476, 0), z_dir=(0, 0, -1))) as fillet5_2_piece_3:
        with BuildLine():
            CenterArc((FILLET5_R * 0.414213562373, -FILLET5_R), FILLET5_R, 90, 45)
            Line((-FILLET5_R * 0.292893218813, -FILLET5_R * 0.292893218813), (0, 0))
            Line((0, 0), (FILLET5_R * 0.414213562373, 0))
        make_face()
    extrude(amount=18.142135624, mode=Mode.SUBTRACT)

    # Sketch10 → Cut-Extrude11 (cut)
    with BuildSketch(Plane(origin=(0, 0, 0), x_dir=(-1, 0, 0), z_dir=(0, 0, -1))):
        Polygon((-97.883419246, 12.8), (-101.116580754, 12.8), (-102.733161507, 10), (-101.116580754, 7.2), (-97.883419246, 7.2), (-96.266838493, 10), align=None)
    cut_extrude11 = extrude(amount=-CUT_EXTRUDE11_DEPTH, mode=Mode.SUBTRACT)

    # Chamfer3
    chamfer3_edges = [part.edges().sort_by_distance(p)[0] for p in [
        (97.075128869, 11.4, 0),
        (99.5, 12.8, 0),
        (101.924871131, 11.4, 0),
        (101.924871131, 8.6, 0),
        (99.5, 7.2, 0),
        (97.075128869, 8.6, 0),
    ]]
    chamfer(chamfer3_edges, length=CHAMFER3_SIZE)

    # LPattern2: Cut-Extrude11 ×3
    with Locations(*[(-i * LPATTERN2_PITCH, 0, 0) for i in range(1, LPATTERN2_COUNT)]):
        add(cut_extrude11, mode=Mode.SUBTRACT)

    # Chamfer3 of LPattern2
    chamfer3_of_lpattern2_edges = [part.edges().sort_by_distance(p)[0] for p in [
        (72.075128869, 11.4, 0),
        (74.5, 12.8, 0),
        (76.924871131, 11.4, 0),
        (76.924871131, 8.6, 0),
        (74.5, 7.2, 0),
        (72.075128869, 8.6, 0),
        (47.075128869, 11.4, 0),
        (49.5, 12.8, 0),
        (51.924871131, 11.4, 0),
        (51.924871131, 8.6, 0),
        (49.5, 7.2, 0),
        (47.075128869, 8.6, 0),
    ]]
    chamfer(chamfer3_of_lpattern2_edges, length=CHAMFER3_OF_LPATTERN2_SIZE)

    # Sketch18 → Cut-Extrude12 (cut)
    with BuildSketch(Plane(origin=(0, 0, 0), x_dir=(-1, 0, 0), z_dir=(0, 0, -1))):
        with Locations((-52.349363477, 8.808264827)):
            Rectangle(SKETCH18_W, SKETCH18_H)
    extrude(amount=-CUT_EXTRUDE12_DEPTH, mode=Mode.SUBTRACT)


solid = part.part
